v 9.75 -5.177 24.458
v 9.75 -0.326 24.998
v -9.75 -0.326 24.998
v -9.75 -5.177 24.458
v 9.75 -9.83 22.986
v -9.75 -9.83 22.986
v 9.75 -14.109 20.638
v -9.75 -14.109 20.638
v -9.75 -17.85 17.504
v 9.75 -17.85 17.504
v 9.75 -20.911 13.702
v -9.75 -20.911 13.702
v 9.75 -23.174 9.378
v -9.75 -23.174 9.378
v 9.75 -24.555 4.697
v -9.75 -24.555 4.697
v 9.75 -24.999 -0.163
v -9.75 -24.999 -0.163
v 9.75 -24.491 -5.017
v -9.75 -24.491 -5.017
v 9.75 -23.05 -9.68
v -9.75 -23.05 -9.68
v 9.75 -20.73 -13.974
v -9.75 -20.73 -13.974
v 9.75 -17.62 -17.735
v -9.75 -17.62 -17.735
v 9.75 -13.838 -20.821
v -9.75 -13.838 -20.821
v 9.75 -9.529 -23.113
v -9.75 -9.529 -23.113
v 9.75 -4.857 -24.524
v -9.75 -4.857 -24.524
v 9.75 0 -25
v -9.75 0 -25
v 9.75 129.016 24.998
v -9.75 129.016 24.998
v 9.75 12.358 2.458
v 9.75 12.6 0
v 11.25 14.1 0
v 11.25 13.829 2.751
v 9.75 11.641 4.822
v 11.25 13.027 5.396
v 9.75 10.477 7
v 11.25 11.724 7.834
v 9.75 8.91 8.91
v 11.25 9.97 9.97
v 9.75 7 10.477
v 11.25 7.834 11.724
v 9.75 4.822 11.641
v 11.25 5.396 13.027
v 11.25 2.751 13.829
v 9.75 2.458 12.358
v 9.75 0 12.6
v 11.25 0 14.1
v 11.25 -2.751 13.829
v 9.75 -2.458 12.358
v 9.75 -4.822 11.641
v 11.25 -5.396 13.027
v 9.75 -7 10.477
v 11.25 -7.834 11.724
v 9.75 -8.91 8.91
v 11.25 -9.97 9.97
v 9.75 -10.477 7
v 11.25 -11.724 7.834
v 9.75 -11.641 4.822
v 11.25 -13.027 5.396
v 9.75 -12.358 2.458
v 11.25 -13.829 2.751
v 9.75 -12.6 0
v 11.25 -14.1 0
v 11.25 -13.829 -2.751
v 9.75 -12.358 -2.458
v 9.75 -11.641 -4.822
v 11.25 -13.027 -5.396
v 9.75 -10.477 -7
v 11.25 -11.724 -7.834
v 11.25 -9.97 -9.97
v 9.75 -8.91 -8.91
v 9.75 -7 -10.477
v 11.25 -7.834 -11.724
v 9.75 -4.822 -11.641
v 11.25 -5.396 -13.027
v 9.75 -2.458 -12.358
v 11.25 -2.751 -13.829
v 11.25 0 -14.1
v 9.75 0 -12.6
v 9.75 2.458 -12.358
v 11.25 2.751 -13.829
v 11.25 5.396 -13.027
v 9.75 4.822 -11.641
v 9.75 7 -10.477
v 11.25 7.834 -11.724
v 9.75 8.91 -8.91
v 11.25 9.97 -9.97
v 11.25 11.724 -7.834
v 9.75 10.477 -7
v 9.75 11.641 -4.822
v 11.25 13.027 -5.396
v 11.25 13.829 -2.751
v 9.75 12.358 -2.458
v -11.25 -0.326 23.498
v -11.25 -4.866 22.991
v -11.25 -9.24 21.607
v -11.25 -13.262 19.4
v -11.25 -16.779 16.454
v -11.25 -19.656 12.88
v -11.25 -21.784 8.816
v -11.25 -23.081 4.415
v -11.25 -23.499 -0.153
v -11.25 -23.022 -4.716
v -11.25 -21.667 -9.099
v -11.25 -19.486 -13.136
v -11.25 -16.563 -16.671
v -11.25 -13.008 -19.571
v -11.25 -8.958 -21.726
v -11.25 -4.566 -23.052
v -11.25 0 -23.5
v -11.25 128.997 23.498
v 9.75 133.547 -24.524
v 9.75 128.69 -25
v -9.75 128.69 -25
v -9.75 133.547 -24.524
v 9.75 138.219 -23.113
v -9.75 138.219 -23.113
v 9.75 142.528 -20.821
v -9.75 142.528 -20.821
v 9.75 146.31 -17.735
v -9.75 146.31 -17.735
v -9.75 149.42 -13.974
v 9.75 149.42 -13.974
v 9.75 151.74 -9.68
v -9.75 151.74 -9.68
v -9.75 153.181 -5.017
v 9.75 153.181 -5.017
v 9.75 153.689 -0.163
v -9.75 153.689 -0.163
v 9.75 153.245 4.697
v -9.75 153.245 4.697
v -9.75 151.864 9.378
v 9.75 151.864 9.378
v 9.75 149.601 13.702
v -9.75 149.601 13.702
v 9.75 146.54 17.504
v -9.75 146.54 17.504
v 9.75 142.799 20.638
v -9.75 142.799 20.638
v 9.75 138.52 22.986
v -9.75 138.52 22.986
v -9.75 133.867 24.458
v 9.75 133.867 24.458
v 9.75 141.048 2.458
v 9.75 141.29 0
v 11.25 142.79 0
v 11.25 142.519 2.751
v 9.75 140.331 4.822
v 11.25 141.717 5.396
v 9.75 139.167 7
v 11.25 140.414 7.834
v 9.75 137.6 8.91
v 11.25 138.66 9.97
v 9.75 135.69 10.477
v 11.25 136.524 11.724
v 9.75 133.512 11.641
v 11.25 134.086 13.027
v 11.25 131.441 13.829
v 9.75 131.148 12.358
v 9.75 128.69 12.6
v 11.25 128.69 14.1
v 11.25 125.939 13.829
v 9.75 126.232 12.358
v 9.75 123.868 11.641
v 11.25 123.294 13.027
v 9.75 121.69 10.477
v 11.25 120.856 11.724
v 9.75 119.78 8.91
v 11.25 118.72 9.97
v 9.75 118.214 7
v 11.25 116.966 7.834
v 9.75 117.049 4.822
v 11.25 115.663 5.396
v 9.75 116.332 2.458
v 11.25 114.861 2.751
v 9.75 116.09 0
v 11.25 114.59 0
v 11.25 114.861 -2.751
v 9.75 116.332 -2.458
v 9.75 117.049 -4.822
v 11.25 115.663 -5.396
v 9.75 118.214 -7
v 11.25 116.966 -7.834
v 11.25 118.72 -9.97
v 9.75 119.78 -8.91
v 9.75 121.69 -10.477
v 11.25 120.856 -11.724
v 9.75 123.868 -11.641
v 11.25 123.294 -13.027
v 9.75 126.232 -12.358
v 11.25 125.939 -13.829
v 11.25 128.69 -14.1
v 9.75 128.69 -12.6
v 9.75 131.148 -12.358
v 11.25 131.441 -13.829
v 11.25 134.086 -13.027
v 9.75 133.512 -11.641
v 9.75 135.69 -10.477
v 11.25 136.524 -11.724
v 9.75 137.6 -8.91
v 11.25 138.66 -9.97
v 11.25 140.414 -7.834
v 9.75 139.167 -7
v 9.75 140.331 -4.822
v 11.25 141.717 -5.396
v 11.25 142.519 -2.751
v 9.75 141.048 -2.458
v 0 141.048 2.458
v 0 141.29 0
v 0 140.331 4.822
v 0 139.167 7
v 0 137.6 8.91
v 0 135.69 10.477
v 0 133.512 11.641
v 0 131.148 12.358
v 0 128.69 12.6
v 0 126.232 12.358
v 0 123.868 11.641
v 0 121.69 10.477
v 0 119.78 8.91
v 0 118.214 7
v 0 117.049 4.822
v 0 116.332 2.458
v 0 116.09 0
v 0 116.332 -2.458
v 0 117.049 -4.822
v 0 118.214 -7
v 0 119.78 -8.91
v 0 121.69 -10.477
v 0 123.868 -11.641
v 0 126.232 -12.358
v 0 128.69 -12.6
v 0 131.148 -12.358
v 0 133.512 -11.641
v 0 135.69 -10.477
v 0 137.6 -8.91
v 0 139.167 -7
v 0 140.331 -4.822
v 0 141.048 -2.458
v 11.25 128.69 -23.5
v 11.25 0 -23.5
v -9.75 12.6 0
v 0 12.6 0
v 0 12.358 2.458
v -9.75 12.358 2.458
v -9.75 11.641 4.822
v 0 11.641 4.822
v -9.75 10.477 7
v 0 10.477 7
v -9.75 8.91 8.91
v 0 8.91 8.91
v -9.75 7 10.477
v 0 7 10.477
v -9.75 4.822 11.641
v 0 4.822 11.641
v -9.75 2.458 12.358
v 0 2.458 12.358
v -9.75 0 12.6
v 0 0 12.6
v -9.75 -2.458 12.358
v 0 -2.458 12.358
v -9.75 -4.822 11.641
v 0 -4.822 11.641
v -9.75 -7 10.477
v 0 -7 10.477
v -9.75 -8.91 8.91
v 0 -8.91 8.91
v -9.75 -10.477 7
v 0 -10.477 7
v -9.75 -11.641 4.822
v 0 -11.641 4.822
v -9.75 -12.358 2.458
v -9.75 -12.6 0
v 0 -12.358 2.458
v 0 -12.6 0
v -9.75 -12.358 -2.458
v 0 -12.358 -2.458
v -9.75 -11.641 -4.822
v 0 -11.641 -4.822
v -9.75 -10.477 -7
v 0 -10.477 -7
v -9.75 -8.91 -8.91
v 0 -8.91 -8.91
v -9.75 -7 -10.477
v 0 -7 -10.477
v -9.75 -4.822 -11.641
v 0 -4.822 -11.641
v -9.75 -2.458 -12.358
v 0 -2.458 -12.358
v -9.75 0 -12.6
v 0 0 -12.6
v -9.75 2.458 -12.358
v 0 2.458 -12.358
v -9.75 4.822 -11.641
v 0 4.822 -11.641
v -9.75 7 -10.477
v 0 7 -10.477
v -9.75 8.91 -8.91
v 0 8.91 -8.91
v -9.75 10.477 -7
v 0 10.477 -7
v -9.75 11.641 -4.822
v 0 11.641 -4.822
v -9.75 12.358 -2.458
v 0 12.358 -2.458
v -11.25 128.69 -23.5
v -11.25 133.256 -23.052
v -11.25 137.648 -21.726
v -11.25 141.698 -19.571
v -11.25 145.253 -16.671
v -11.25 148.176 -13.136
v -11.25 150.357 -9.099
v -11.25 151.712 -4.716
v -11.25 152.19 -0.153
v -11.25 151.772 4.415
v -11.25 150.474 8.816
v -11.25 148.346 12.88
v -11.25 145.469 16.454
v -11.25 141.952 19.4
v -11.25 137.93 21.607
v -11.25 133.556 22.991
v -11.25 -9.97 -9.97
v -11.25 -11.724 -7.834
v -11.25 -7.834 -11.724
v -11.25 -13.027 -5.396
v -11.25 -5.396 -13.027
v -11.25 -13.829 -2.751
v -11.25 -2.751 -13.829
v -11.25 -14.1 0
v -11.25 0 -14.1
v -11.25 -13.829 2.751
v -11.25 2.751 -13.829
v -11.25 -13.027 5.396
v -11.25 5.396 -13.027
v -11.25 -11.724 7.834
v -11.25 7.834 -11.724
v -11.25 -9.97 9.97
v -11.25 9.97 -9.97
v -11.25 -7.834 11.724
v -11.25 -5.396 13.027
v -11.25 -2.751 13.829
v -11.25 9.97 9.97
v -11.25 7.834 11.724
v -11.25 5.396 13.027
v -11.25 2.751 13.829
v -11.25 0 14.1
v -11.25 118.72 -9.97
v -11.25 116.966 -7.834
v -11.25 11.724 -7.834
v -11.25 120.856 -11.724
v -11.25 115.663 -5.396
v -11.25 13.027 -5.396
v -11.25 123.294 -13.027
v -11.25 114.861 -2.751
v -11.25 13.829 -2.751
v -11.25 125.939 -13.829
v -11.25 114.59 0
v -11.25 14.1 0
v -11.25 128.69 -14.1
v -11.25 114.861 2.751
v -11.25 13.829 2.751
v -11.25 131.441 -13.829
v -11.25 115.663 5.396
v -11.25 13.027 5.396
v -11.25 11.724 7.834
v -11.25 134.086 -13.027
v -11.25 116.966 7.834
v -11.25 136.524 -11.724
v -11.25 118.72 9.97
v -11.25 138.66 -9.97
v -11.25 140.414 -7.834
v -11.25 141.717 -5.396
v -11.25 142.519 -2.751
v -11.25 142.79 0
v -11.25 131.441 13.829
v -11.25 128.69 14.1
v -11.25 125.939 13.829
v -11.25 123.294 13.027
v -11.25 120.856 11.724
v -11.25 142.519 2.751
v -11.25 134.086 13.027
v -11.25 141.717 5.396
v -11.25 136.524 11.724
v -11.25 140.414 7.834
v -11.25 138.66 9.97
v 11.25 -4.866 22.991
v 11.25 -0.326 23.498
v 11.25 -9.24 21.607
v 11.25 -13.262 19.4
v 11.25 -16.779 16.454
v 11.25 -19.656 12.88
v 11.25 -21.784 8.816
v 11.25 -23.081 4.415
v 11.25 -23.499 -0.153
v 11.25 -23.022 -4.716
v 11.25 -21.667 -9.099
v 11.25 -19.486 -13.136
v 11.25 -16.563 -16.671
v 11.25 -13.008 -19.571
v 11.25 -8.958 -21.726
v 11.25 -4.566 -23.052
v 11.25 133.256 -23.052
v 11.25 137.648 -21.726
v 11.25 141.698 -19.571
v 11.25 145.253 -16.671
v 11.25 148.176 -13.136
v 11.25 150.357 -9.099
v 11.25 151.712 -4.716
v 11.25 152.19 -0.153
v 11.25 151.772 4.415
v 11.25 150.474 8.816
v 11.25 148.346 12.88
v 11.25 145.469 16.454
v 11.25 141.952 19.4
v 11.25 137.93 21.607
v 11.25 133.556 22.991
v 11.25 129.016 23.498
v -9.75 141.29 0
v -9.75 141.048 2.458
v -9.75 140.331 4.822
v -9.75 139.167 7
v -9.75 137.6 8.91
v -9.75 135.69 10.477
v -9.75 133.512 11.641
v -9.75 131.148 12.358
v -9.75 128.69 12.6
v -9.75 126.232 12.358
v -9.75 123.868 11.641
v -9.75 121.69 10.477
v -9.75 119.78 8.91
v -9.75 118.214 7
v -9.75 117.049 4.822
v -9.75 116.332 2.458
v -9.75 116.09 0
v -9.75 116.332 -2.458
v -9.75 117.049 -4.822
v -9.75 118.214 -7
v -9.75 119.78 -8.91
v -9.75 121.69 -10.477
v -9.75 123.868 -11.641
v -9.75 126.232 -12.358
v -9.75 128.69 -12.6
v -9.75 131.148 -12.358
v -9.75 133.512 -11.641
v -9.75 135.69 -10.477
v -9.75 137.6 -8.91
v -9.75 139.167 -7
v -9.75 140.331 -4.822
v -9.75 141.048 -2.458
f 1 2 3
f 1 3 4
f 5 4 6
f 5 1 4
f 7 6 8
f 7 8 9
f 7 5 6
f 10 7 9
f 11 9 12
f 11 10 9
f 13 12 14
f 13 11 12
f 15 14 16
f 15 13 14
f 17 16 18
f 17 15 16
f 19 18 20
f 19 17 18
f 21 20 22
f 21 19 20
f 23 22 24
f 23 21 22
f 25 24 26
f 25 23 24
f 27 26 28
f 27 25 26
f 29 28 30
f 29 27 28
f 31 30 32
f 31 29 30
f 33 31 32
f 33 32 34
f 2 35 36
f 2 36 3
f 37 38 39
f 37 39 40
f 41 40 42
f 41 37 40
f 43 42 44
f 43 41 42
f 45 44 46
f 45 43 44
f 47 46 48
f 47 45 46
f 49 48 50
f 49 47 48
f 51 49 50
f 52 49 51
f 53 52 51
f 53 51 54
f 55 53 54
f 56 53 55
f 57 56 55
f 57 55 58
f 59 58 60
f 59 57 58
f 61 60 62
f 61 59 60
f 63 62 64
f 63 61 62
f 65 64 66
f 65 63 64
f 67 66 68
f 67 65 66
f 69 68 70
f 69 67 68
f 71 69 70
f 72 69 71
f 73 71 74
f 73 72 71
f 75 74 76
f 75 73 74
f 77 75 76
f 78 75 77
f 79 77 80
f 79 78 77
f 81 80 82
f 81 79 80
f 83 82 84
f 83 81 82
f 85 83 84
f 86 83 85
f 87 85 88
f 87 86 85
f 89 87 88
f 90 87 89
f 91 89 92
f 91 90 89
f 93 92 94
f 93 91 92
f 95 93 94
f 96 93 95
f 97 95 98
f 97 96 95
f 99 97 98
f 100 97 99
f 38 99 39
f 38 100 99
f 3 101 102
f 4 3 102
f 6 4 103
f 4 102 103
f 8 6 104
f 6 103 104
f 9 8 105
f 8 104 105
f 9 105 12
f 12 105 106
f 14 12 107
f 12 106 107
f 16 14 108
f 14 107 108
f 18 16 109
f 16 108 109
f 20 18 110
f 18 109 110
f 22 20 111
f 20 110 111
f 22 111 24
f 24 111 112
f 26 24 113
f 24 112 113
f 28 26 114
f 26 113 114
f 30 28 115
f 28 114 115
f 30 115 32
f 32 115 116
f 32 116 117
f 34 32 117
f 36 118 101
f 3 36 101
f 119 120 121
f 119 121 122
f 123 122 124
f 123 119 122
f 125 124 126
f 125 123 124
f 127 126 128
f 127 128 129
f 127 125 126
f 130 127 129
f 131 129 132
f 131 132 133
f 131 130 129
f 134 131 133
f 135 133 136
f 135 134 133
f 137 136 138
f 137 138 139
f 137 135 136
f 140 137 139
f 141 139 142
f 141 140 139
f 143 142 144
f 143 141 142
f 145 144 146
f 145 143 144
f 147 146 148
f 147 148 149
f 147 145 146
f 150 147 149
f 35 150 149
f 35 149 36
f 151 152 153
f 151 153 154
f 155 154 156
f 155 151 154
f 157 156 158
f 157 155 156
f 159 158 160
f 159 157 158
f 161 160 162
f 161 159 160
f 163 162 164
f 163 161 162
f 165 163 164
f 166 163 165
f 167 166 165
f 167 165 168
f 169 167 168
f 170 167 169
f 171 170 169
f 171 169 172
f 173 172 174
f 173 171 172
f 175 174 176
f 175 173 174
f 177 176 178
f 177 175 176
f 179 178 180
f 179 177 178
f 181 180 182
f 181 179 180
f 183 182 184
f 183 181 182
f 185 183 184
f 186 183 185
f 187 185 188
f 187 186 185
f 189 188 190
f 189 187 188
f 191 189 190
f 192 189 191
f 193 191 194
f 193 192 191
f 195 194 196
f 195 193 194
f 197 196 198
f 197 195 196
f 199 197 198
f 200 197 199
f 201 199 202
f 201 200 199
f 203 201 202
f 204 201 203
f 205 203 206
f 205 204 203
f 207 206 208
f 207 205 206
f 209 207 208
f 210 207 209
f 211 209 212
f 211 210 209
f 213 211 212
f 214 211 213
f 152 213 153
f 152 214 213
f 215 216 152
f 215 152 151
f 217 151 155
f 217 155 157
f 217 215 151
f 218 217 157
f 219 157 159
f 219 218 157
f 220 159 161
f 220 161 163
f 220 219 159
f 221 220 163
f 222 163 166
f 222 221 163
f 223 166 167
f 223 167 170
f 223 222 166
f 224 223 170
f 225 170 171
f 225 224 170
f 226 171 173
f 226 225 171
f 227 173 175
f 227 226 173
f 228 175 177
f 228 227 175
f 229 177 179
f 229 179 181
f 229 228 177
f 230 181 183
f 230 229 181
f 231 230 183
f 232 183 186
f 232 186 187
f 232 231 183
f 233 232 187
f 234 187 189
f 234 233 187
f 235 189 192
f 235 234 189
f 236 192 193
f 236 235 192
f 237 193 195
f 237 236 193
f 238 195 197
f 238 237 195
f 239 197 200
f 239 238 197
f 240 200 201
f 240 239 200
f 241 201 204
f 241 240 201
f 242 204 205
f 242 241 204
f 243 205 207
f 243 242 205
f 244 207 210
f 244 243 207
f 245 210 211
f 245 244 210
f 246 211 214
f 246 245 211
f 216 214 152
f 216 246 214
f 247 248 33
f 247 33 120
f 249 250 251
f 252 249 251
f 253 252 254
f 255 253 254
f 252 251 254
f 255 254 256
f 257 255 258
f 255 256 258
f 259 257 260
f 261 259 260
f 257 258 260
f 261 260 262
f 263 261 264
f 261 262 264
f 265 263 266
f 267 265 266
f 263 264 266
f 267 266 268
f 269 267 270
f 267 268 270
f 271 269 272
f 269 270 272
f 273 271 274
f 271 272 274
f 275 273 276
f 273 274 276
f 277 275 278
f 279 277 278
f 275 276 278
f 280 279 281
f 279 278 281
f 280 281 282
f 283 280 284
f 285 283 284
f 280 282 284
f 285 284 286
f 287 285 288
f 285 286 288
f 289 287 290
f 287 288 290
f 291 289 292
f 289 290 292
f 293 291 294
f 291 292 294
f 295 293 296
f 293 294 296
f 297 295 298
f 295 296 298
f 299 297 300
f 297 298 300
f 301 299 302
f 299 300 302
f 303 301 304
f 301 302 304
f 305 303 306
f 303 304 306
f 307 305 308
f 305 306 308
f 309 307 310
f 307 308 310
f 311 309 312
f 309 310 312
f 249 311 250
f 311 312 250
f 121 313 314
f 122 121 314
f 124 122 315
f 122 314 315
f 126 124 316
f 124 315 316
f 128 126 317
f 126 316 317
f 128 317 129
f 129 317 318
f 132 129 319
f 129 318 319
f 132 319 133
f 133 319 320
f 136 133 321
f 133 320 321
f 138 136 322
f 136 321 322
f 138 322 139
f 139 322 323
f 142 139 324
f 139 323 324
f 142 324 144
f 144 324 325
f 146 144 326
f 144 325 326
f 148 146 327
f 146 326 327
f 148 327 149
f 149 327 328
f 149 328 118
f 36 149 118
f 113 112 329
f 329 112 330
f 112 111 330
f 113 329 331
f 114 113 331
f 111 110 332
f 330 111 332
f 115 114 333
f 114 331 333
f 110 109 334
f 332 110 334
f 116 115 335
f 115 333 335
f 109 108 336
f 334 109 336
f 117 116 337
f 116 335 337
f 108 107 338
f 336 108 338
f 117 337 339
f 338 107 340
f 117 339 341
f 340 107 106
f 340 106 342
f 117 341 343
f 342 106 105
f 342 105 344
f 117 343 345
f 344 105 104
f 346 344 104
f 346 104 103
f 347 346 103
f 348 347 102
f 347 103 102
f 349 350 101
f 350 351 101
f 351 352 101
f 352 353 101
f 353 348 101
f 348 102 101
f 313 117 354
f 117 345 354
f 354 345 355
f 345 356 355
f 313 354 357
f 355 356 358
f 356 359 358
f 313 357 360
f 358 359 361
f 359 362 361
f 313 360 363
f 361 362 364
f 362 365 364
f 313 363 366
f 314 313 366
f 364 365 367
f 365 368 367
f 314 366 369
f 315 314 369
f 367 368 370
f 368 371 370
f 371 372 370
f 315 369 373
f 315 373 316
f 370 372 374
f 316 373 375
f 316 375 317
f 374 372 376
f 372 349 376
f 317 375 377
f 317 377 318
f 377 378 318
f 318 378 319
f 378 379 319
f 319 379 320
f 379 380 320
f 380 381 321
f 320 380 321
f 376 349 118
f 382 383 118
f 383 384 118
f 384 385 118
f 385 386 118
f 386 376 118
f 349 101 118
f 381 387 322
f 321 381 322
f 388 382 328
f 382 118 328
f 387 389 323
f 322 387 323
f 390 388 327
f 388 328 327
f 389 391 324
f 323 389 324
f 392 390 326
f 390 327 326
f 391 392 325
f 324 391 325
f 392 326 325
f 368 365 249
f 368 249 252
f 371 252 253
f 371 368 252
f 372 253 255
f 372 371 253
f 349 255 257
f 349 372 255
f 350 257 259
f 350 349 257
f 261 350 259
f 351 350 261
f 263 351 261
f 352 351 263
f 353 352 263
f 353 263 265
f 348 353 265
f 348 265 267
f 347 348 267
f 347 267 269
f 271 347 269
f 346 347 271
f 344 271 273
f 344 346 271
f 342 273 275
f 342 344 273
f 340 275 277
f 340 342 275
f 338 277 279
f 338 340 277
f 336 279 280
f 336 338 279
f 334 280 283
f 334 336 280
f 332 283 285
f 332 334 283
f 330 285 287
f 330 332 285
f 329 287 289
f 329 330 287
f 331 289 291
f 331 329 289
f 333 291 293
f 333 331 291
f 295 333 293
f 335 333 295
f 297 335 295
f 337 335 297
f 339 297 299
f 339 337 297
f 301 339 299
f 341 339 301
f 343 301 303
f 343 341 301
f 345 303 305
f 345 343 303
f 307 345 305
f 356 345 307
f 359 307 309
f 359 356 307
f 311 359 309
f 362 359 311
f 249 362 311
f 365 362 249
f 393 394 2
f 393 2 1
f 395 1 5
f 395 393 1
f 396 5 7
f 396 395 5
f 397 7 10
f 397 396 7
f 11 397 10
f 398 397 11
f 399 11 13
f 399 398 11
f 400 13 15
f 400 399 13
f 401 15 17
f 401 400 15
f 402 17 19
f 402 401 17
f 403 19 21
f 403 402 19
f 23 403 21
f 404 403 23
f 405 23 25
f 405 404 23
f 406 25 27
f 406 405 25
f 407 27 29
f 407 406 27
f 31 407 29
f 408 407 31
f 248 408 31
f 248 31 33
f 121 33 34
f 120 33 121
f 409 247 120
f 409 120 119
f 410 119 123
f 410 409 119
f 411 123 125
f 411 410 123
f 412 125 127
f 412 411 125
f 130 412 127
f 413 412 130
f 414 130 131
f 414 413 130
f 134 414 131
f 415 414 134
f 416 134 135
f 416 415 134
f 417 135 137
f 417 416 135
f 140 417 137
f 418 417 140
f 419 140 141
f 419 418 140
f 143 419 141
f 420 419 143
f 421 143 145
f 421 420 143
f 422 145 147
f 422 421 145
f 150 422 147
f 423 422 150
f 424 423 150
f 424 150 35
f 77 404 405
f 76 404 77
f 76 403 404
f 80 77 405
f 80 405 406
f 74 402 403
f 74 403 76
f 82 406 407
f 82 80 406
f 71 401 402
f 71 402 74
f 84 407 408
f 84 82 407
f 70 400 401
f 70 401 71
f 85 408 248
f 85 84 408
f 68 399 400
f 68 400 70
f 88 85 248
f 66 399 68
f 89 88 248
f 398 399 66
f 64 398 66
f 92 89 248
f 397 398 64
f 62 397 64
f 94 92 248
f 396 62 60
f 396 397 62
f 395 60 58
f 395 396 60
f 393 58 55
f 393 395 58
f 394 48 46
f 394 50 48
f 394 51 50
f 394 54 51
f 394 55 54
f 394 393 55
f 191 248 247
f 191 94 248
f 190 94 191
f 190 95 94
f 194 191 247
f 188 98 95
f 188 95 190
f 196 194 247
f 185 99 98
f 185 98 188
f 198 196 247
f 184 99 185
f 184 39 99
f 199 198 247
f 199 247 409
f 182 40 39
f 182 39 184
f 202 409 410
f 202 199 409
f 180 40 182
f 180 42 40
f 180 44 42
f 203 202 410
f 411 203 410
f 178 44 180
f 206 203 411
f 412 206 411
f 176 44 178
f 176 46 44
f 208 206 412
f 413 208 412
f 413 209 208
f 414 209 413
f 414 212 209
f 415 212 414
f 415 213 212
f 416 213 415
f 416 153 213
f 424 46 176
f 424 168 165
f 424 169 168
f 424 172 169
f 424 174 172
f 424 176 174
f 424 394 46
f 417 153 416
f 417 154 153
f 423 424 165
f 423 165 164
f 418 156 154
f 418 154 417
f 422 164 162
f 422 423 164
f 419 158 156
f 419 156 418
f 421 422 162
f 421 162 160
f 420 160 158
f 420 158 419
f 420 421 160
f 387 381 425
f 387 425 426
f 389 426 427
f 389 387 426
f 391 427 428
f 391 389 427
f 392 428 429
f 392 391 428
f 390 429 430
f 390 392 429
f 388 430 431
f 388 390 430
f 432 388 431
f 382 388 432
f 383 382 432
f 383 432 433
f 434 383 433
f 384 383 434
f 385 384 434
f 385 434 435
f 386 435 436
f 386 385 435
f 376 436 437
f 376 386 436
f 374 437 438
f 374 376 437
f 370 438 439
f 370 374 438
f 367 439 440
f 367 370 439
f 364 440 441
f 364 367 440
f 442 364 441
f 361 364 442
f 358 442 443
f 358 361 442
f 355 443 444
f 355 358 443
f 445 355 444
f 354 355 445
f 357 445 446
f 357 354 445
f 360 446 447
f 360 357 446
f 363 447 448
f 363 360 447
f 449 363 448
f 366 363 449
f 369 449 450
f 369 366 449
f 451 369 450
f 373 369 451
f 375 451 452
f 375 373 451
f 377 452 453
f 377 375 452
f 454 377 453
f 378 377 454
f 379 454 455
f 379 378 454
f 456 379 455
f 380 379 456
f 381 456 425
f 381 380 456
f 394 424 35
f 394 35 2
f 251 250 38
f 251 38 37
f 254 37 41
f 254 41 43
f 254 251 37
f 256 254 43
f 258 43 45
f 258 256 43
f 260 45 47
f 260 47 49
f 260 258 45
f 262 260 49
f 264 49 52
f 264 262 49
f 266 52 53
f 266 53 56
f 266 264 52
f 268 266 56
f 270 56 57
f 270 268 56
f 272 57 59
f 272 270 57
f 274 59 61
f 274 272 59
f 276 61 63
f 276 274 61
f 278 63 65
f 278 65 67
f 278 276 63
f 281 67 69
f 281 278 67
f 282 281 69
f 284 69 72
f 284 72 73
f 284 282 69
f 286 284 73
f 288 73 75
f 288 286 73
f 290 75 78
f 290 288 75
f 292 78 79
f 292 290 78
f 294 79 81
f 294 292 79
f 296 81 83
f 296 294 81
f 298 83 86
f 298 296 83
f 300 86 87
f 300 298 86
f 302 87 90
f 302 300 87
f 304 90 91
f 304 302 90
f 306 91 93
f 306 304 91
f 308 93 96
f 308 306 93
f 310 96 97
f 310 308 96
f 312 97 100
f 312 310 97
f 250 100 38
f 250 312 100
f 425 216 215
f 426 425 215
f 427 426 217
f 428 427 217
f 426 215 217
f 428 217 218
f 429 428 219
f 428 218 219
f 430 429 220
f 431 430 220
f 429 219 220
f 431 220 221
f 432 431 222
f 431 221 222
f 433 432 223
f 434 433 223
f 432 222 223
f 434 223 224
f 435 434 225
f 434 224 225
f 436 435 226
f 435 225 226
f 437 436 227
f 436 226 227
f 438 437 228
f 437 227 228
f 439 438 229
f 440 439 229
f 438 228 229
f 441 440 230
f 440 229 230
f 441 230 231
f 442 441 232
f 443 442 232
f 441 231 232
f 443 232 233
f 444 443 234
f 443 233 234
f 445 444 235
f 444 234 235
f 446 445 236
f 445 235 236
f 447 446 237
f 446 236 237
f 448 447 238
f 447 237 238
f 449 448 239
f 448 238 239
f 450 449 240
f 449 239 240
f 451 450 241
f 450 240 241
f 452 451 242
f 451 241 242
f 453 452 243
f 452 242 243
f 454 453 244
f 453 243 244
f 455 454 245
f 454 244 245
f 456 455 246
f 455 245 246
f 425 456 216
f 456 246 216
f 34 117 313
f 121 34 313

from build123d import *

# Parameters (mm, degrees)
F1_R          = 12.6
F2_DEPTH      = 11.25
F2_DEPTH_BACK = 11.25
F3_SIZE       = 1.5


with BuildPart() as f2:
    # F1 (on face) → F2 (new body, two sides)
    with BuildSketch(Plane.YZ) as f2_sk:
        with BuildLine():
            Line((129.016359, 24.99787), (128.36368, 24.99787))
            Line((128.36368, 24.99787), (0.32634, 24.99787))
            Line((0.32634, 24.99787), (-0.32634, 24.99787))
            ThreePointArc((-0.32634, 24.99787), (-24.999467, -0.163173), (0, -25))
            Line((0, -25), (128.690019, -25))
            ThreePointArc((128.690019, -25), (153.689487, -0.163173), (129.016359, 24.99787))
        make_face()
        Circle(F1_R, mode=Mode.SUBTRACT)
        with Locations((128.690019, 0)):
            Circle(F1_R, mode=Mode.SUBTRACT)
    extrude(amount=F2_DEPTH)
    extrude(f2_sk.sketch, amount=-F2_DEPTH_BACK)

    # F3
    f3_edges = [f2.edges().sort_by_distance(p)[0] for p in [
        (-11.25, 116.090019, 0),
        (-11.25, 153.689487, -0.163173),
        (-11.25, 64.34501, -25),
        (-11.25, 64.34501, 24.99787),
        (-11.25, -12.6, 0),
        (11.25, 64.34501, 24.99787),
        (11.25, -24.999467, -0.163173),
        (11.25, -12.6, 0),
        (0, 12.6, 0),
        (11.25, 116.090019, 0),
    ]]
    chamfer(f3_edges, length=F3_SIZE)


solid = f2.part
